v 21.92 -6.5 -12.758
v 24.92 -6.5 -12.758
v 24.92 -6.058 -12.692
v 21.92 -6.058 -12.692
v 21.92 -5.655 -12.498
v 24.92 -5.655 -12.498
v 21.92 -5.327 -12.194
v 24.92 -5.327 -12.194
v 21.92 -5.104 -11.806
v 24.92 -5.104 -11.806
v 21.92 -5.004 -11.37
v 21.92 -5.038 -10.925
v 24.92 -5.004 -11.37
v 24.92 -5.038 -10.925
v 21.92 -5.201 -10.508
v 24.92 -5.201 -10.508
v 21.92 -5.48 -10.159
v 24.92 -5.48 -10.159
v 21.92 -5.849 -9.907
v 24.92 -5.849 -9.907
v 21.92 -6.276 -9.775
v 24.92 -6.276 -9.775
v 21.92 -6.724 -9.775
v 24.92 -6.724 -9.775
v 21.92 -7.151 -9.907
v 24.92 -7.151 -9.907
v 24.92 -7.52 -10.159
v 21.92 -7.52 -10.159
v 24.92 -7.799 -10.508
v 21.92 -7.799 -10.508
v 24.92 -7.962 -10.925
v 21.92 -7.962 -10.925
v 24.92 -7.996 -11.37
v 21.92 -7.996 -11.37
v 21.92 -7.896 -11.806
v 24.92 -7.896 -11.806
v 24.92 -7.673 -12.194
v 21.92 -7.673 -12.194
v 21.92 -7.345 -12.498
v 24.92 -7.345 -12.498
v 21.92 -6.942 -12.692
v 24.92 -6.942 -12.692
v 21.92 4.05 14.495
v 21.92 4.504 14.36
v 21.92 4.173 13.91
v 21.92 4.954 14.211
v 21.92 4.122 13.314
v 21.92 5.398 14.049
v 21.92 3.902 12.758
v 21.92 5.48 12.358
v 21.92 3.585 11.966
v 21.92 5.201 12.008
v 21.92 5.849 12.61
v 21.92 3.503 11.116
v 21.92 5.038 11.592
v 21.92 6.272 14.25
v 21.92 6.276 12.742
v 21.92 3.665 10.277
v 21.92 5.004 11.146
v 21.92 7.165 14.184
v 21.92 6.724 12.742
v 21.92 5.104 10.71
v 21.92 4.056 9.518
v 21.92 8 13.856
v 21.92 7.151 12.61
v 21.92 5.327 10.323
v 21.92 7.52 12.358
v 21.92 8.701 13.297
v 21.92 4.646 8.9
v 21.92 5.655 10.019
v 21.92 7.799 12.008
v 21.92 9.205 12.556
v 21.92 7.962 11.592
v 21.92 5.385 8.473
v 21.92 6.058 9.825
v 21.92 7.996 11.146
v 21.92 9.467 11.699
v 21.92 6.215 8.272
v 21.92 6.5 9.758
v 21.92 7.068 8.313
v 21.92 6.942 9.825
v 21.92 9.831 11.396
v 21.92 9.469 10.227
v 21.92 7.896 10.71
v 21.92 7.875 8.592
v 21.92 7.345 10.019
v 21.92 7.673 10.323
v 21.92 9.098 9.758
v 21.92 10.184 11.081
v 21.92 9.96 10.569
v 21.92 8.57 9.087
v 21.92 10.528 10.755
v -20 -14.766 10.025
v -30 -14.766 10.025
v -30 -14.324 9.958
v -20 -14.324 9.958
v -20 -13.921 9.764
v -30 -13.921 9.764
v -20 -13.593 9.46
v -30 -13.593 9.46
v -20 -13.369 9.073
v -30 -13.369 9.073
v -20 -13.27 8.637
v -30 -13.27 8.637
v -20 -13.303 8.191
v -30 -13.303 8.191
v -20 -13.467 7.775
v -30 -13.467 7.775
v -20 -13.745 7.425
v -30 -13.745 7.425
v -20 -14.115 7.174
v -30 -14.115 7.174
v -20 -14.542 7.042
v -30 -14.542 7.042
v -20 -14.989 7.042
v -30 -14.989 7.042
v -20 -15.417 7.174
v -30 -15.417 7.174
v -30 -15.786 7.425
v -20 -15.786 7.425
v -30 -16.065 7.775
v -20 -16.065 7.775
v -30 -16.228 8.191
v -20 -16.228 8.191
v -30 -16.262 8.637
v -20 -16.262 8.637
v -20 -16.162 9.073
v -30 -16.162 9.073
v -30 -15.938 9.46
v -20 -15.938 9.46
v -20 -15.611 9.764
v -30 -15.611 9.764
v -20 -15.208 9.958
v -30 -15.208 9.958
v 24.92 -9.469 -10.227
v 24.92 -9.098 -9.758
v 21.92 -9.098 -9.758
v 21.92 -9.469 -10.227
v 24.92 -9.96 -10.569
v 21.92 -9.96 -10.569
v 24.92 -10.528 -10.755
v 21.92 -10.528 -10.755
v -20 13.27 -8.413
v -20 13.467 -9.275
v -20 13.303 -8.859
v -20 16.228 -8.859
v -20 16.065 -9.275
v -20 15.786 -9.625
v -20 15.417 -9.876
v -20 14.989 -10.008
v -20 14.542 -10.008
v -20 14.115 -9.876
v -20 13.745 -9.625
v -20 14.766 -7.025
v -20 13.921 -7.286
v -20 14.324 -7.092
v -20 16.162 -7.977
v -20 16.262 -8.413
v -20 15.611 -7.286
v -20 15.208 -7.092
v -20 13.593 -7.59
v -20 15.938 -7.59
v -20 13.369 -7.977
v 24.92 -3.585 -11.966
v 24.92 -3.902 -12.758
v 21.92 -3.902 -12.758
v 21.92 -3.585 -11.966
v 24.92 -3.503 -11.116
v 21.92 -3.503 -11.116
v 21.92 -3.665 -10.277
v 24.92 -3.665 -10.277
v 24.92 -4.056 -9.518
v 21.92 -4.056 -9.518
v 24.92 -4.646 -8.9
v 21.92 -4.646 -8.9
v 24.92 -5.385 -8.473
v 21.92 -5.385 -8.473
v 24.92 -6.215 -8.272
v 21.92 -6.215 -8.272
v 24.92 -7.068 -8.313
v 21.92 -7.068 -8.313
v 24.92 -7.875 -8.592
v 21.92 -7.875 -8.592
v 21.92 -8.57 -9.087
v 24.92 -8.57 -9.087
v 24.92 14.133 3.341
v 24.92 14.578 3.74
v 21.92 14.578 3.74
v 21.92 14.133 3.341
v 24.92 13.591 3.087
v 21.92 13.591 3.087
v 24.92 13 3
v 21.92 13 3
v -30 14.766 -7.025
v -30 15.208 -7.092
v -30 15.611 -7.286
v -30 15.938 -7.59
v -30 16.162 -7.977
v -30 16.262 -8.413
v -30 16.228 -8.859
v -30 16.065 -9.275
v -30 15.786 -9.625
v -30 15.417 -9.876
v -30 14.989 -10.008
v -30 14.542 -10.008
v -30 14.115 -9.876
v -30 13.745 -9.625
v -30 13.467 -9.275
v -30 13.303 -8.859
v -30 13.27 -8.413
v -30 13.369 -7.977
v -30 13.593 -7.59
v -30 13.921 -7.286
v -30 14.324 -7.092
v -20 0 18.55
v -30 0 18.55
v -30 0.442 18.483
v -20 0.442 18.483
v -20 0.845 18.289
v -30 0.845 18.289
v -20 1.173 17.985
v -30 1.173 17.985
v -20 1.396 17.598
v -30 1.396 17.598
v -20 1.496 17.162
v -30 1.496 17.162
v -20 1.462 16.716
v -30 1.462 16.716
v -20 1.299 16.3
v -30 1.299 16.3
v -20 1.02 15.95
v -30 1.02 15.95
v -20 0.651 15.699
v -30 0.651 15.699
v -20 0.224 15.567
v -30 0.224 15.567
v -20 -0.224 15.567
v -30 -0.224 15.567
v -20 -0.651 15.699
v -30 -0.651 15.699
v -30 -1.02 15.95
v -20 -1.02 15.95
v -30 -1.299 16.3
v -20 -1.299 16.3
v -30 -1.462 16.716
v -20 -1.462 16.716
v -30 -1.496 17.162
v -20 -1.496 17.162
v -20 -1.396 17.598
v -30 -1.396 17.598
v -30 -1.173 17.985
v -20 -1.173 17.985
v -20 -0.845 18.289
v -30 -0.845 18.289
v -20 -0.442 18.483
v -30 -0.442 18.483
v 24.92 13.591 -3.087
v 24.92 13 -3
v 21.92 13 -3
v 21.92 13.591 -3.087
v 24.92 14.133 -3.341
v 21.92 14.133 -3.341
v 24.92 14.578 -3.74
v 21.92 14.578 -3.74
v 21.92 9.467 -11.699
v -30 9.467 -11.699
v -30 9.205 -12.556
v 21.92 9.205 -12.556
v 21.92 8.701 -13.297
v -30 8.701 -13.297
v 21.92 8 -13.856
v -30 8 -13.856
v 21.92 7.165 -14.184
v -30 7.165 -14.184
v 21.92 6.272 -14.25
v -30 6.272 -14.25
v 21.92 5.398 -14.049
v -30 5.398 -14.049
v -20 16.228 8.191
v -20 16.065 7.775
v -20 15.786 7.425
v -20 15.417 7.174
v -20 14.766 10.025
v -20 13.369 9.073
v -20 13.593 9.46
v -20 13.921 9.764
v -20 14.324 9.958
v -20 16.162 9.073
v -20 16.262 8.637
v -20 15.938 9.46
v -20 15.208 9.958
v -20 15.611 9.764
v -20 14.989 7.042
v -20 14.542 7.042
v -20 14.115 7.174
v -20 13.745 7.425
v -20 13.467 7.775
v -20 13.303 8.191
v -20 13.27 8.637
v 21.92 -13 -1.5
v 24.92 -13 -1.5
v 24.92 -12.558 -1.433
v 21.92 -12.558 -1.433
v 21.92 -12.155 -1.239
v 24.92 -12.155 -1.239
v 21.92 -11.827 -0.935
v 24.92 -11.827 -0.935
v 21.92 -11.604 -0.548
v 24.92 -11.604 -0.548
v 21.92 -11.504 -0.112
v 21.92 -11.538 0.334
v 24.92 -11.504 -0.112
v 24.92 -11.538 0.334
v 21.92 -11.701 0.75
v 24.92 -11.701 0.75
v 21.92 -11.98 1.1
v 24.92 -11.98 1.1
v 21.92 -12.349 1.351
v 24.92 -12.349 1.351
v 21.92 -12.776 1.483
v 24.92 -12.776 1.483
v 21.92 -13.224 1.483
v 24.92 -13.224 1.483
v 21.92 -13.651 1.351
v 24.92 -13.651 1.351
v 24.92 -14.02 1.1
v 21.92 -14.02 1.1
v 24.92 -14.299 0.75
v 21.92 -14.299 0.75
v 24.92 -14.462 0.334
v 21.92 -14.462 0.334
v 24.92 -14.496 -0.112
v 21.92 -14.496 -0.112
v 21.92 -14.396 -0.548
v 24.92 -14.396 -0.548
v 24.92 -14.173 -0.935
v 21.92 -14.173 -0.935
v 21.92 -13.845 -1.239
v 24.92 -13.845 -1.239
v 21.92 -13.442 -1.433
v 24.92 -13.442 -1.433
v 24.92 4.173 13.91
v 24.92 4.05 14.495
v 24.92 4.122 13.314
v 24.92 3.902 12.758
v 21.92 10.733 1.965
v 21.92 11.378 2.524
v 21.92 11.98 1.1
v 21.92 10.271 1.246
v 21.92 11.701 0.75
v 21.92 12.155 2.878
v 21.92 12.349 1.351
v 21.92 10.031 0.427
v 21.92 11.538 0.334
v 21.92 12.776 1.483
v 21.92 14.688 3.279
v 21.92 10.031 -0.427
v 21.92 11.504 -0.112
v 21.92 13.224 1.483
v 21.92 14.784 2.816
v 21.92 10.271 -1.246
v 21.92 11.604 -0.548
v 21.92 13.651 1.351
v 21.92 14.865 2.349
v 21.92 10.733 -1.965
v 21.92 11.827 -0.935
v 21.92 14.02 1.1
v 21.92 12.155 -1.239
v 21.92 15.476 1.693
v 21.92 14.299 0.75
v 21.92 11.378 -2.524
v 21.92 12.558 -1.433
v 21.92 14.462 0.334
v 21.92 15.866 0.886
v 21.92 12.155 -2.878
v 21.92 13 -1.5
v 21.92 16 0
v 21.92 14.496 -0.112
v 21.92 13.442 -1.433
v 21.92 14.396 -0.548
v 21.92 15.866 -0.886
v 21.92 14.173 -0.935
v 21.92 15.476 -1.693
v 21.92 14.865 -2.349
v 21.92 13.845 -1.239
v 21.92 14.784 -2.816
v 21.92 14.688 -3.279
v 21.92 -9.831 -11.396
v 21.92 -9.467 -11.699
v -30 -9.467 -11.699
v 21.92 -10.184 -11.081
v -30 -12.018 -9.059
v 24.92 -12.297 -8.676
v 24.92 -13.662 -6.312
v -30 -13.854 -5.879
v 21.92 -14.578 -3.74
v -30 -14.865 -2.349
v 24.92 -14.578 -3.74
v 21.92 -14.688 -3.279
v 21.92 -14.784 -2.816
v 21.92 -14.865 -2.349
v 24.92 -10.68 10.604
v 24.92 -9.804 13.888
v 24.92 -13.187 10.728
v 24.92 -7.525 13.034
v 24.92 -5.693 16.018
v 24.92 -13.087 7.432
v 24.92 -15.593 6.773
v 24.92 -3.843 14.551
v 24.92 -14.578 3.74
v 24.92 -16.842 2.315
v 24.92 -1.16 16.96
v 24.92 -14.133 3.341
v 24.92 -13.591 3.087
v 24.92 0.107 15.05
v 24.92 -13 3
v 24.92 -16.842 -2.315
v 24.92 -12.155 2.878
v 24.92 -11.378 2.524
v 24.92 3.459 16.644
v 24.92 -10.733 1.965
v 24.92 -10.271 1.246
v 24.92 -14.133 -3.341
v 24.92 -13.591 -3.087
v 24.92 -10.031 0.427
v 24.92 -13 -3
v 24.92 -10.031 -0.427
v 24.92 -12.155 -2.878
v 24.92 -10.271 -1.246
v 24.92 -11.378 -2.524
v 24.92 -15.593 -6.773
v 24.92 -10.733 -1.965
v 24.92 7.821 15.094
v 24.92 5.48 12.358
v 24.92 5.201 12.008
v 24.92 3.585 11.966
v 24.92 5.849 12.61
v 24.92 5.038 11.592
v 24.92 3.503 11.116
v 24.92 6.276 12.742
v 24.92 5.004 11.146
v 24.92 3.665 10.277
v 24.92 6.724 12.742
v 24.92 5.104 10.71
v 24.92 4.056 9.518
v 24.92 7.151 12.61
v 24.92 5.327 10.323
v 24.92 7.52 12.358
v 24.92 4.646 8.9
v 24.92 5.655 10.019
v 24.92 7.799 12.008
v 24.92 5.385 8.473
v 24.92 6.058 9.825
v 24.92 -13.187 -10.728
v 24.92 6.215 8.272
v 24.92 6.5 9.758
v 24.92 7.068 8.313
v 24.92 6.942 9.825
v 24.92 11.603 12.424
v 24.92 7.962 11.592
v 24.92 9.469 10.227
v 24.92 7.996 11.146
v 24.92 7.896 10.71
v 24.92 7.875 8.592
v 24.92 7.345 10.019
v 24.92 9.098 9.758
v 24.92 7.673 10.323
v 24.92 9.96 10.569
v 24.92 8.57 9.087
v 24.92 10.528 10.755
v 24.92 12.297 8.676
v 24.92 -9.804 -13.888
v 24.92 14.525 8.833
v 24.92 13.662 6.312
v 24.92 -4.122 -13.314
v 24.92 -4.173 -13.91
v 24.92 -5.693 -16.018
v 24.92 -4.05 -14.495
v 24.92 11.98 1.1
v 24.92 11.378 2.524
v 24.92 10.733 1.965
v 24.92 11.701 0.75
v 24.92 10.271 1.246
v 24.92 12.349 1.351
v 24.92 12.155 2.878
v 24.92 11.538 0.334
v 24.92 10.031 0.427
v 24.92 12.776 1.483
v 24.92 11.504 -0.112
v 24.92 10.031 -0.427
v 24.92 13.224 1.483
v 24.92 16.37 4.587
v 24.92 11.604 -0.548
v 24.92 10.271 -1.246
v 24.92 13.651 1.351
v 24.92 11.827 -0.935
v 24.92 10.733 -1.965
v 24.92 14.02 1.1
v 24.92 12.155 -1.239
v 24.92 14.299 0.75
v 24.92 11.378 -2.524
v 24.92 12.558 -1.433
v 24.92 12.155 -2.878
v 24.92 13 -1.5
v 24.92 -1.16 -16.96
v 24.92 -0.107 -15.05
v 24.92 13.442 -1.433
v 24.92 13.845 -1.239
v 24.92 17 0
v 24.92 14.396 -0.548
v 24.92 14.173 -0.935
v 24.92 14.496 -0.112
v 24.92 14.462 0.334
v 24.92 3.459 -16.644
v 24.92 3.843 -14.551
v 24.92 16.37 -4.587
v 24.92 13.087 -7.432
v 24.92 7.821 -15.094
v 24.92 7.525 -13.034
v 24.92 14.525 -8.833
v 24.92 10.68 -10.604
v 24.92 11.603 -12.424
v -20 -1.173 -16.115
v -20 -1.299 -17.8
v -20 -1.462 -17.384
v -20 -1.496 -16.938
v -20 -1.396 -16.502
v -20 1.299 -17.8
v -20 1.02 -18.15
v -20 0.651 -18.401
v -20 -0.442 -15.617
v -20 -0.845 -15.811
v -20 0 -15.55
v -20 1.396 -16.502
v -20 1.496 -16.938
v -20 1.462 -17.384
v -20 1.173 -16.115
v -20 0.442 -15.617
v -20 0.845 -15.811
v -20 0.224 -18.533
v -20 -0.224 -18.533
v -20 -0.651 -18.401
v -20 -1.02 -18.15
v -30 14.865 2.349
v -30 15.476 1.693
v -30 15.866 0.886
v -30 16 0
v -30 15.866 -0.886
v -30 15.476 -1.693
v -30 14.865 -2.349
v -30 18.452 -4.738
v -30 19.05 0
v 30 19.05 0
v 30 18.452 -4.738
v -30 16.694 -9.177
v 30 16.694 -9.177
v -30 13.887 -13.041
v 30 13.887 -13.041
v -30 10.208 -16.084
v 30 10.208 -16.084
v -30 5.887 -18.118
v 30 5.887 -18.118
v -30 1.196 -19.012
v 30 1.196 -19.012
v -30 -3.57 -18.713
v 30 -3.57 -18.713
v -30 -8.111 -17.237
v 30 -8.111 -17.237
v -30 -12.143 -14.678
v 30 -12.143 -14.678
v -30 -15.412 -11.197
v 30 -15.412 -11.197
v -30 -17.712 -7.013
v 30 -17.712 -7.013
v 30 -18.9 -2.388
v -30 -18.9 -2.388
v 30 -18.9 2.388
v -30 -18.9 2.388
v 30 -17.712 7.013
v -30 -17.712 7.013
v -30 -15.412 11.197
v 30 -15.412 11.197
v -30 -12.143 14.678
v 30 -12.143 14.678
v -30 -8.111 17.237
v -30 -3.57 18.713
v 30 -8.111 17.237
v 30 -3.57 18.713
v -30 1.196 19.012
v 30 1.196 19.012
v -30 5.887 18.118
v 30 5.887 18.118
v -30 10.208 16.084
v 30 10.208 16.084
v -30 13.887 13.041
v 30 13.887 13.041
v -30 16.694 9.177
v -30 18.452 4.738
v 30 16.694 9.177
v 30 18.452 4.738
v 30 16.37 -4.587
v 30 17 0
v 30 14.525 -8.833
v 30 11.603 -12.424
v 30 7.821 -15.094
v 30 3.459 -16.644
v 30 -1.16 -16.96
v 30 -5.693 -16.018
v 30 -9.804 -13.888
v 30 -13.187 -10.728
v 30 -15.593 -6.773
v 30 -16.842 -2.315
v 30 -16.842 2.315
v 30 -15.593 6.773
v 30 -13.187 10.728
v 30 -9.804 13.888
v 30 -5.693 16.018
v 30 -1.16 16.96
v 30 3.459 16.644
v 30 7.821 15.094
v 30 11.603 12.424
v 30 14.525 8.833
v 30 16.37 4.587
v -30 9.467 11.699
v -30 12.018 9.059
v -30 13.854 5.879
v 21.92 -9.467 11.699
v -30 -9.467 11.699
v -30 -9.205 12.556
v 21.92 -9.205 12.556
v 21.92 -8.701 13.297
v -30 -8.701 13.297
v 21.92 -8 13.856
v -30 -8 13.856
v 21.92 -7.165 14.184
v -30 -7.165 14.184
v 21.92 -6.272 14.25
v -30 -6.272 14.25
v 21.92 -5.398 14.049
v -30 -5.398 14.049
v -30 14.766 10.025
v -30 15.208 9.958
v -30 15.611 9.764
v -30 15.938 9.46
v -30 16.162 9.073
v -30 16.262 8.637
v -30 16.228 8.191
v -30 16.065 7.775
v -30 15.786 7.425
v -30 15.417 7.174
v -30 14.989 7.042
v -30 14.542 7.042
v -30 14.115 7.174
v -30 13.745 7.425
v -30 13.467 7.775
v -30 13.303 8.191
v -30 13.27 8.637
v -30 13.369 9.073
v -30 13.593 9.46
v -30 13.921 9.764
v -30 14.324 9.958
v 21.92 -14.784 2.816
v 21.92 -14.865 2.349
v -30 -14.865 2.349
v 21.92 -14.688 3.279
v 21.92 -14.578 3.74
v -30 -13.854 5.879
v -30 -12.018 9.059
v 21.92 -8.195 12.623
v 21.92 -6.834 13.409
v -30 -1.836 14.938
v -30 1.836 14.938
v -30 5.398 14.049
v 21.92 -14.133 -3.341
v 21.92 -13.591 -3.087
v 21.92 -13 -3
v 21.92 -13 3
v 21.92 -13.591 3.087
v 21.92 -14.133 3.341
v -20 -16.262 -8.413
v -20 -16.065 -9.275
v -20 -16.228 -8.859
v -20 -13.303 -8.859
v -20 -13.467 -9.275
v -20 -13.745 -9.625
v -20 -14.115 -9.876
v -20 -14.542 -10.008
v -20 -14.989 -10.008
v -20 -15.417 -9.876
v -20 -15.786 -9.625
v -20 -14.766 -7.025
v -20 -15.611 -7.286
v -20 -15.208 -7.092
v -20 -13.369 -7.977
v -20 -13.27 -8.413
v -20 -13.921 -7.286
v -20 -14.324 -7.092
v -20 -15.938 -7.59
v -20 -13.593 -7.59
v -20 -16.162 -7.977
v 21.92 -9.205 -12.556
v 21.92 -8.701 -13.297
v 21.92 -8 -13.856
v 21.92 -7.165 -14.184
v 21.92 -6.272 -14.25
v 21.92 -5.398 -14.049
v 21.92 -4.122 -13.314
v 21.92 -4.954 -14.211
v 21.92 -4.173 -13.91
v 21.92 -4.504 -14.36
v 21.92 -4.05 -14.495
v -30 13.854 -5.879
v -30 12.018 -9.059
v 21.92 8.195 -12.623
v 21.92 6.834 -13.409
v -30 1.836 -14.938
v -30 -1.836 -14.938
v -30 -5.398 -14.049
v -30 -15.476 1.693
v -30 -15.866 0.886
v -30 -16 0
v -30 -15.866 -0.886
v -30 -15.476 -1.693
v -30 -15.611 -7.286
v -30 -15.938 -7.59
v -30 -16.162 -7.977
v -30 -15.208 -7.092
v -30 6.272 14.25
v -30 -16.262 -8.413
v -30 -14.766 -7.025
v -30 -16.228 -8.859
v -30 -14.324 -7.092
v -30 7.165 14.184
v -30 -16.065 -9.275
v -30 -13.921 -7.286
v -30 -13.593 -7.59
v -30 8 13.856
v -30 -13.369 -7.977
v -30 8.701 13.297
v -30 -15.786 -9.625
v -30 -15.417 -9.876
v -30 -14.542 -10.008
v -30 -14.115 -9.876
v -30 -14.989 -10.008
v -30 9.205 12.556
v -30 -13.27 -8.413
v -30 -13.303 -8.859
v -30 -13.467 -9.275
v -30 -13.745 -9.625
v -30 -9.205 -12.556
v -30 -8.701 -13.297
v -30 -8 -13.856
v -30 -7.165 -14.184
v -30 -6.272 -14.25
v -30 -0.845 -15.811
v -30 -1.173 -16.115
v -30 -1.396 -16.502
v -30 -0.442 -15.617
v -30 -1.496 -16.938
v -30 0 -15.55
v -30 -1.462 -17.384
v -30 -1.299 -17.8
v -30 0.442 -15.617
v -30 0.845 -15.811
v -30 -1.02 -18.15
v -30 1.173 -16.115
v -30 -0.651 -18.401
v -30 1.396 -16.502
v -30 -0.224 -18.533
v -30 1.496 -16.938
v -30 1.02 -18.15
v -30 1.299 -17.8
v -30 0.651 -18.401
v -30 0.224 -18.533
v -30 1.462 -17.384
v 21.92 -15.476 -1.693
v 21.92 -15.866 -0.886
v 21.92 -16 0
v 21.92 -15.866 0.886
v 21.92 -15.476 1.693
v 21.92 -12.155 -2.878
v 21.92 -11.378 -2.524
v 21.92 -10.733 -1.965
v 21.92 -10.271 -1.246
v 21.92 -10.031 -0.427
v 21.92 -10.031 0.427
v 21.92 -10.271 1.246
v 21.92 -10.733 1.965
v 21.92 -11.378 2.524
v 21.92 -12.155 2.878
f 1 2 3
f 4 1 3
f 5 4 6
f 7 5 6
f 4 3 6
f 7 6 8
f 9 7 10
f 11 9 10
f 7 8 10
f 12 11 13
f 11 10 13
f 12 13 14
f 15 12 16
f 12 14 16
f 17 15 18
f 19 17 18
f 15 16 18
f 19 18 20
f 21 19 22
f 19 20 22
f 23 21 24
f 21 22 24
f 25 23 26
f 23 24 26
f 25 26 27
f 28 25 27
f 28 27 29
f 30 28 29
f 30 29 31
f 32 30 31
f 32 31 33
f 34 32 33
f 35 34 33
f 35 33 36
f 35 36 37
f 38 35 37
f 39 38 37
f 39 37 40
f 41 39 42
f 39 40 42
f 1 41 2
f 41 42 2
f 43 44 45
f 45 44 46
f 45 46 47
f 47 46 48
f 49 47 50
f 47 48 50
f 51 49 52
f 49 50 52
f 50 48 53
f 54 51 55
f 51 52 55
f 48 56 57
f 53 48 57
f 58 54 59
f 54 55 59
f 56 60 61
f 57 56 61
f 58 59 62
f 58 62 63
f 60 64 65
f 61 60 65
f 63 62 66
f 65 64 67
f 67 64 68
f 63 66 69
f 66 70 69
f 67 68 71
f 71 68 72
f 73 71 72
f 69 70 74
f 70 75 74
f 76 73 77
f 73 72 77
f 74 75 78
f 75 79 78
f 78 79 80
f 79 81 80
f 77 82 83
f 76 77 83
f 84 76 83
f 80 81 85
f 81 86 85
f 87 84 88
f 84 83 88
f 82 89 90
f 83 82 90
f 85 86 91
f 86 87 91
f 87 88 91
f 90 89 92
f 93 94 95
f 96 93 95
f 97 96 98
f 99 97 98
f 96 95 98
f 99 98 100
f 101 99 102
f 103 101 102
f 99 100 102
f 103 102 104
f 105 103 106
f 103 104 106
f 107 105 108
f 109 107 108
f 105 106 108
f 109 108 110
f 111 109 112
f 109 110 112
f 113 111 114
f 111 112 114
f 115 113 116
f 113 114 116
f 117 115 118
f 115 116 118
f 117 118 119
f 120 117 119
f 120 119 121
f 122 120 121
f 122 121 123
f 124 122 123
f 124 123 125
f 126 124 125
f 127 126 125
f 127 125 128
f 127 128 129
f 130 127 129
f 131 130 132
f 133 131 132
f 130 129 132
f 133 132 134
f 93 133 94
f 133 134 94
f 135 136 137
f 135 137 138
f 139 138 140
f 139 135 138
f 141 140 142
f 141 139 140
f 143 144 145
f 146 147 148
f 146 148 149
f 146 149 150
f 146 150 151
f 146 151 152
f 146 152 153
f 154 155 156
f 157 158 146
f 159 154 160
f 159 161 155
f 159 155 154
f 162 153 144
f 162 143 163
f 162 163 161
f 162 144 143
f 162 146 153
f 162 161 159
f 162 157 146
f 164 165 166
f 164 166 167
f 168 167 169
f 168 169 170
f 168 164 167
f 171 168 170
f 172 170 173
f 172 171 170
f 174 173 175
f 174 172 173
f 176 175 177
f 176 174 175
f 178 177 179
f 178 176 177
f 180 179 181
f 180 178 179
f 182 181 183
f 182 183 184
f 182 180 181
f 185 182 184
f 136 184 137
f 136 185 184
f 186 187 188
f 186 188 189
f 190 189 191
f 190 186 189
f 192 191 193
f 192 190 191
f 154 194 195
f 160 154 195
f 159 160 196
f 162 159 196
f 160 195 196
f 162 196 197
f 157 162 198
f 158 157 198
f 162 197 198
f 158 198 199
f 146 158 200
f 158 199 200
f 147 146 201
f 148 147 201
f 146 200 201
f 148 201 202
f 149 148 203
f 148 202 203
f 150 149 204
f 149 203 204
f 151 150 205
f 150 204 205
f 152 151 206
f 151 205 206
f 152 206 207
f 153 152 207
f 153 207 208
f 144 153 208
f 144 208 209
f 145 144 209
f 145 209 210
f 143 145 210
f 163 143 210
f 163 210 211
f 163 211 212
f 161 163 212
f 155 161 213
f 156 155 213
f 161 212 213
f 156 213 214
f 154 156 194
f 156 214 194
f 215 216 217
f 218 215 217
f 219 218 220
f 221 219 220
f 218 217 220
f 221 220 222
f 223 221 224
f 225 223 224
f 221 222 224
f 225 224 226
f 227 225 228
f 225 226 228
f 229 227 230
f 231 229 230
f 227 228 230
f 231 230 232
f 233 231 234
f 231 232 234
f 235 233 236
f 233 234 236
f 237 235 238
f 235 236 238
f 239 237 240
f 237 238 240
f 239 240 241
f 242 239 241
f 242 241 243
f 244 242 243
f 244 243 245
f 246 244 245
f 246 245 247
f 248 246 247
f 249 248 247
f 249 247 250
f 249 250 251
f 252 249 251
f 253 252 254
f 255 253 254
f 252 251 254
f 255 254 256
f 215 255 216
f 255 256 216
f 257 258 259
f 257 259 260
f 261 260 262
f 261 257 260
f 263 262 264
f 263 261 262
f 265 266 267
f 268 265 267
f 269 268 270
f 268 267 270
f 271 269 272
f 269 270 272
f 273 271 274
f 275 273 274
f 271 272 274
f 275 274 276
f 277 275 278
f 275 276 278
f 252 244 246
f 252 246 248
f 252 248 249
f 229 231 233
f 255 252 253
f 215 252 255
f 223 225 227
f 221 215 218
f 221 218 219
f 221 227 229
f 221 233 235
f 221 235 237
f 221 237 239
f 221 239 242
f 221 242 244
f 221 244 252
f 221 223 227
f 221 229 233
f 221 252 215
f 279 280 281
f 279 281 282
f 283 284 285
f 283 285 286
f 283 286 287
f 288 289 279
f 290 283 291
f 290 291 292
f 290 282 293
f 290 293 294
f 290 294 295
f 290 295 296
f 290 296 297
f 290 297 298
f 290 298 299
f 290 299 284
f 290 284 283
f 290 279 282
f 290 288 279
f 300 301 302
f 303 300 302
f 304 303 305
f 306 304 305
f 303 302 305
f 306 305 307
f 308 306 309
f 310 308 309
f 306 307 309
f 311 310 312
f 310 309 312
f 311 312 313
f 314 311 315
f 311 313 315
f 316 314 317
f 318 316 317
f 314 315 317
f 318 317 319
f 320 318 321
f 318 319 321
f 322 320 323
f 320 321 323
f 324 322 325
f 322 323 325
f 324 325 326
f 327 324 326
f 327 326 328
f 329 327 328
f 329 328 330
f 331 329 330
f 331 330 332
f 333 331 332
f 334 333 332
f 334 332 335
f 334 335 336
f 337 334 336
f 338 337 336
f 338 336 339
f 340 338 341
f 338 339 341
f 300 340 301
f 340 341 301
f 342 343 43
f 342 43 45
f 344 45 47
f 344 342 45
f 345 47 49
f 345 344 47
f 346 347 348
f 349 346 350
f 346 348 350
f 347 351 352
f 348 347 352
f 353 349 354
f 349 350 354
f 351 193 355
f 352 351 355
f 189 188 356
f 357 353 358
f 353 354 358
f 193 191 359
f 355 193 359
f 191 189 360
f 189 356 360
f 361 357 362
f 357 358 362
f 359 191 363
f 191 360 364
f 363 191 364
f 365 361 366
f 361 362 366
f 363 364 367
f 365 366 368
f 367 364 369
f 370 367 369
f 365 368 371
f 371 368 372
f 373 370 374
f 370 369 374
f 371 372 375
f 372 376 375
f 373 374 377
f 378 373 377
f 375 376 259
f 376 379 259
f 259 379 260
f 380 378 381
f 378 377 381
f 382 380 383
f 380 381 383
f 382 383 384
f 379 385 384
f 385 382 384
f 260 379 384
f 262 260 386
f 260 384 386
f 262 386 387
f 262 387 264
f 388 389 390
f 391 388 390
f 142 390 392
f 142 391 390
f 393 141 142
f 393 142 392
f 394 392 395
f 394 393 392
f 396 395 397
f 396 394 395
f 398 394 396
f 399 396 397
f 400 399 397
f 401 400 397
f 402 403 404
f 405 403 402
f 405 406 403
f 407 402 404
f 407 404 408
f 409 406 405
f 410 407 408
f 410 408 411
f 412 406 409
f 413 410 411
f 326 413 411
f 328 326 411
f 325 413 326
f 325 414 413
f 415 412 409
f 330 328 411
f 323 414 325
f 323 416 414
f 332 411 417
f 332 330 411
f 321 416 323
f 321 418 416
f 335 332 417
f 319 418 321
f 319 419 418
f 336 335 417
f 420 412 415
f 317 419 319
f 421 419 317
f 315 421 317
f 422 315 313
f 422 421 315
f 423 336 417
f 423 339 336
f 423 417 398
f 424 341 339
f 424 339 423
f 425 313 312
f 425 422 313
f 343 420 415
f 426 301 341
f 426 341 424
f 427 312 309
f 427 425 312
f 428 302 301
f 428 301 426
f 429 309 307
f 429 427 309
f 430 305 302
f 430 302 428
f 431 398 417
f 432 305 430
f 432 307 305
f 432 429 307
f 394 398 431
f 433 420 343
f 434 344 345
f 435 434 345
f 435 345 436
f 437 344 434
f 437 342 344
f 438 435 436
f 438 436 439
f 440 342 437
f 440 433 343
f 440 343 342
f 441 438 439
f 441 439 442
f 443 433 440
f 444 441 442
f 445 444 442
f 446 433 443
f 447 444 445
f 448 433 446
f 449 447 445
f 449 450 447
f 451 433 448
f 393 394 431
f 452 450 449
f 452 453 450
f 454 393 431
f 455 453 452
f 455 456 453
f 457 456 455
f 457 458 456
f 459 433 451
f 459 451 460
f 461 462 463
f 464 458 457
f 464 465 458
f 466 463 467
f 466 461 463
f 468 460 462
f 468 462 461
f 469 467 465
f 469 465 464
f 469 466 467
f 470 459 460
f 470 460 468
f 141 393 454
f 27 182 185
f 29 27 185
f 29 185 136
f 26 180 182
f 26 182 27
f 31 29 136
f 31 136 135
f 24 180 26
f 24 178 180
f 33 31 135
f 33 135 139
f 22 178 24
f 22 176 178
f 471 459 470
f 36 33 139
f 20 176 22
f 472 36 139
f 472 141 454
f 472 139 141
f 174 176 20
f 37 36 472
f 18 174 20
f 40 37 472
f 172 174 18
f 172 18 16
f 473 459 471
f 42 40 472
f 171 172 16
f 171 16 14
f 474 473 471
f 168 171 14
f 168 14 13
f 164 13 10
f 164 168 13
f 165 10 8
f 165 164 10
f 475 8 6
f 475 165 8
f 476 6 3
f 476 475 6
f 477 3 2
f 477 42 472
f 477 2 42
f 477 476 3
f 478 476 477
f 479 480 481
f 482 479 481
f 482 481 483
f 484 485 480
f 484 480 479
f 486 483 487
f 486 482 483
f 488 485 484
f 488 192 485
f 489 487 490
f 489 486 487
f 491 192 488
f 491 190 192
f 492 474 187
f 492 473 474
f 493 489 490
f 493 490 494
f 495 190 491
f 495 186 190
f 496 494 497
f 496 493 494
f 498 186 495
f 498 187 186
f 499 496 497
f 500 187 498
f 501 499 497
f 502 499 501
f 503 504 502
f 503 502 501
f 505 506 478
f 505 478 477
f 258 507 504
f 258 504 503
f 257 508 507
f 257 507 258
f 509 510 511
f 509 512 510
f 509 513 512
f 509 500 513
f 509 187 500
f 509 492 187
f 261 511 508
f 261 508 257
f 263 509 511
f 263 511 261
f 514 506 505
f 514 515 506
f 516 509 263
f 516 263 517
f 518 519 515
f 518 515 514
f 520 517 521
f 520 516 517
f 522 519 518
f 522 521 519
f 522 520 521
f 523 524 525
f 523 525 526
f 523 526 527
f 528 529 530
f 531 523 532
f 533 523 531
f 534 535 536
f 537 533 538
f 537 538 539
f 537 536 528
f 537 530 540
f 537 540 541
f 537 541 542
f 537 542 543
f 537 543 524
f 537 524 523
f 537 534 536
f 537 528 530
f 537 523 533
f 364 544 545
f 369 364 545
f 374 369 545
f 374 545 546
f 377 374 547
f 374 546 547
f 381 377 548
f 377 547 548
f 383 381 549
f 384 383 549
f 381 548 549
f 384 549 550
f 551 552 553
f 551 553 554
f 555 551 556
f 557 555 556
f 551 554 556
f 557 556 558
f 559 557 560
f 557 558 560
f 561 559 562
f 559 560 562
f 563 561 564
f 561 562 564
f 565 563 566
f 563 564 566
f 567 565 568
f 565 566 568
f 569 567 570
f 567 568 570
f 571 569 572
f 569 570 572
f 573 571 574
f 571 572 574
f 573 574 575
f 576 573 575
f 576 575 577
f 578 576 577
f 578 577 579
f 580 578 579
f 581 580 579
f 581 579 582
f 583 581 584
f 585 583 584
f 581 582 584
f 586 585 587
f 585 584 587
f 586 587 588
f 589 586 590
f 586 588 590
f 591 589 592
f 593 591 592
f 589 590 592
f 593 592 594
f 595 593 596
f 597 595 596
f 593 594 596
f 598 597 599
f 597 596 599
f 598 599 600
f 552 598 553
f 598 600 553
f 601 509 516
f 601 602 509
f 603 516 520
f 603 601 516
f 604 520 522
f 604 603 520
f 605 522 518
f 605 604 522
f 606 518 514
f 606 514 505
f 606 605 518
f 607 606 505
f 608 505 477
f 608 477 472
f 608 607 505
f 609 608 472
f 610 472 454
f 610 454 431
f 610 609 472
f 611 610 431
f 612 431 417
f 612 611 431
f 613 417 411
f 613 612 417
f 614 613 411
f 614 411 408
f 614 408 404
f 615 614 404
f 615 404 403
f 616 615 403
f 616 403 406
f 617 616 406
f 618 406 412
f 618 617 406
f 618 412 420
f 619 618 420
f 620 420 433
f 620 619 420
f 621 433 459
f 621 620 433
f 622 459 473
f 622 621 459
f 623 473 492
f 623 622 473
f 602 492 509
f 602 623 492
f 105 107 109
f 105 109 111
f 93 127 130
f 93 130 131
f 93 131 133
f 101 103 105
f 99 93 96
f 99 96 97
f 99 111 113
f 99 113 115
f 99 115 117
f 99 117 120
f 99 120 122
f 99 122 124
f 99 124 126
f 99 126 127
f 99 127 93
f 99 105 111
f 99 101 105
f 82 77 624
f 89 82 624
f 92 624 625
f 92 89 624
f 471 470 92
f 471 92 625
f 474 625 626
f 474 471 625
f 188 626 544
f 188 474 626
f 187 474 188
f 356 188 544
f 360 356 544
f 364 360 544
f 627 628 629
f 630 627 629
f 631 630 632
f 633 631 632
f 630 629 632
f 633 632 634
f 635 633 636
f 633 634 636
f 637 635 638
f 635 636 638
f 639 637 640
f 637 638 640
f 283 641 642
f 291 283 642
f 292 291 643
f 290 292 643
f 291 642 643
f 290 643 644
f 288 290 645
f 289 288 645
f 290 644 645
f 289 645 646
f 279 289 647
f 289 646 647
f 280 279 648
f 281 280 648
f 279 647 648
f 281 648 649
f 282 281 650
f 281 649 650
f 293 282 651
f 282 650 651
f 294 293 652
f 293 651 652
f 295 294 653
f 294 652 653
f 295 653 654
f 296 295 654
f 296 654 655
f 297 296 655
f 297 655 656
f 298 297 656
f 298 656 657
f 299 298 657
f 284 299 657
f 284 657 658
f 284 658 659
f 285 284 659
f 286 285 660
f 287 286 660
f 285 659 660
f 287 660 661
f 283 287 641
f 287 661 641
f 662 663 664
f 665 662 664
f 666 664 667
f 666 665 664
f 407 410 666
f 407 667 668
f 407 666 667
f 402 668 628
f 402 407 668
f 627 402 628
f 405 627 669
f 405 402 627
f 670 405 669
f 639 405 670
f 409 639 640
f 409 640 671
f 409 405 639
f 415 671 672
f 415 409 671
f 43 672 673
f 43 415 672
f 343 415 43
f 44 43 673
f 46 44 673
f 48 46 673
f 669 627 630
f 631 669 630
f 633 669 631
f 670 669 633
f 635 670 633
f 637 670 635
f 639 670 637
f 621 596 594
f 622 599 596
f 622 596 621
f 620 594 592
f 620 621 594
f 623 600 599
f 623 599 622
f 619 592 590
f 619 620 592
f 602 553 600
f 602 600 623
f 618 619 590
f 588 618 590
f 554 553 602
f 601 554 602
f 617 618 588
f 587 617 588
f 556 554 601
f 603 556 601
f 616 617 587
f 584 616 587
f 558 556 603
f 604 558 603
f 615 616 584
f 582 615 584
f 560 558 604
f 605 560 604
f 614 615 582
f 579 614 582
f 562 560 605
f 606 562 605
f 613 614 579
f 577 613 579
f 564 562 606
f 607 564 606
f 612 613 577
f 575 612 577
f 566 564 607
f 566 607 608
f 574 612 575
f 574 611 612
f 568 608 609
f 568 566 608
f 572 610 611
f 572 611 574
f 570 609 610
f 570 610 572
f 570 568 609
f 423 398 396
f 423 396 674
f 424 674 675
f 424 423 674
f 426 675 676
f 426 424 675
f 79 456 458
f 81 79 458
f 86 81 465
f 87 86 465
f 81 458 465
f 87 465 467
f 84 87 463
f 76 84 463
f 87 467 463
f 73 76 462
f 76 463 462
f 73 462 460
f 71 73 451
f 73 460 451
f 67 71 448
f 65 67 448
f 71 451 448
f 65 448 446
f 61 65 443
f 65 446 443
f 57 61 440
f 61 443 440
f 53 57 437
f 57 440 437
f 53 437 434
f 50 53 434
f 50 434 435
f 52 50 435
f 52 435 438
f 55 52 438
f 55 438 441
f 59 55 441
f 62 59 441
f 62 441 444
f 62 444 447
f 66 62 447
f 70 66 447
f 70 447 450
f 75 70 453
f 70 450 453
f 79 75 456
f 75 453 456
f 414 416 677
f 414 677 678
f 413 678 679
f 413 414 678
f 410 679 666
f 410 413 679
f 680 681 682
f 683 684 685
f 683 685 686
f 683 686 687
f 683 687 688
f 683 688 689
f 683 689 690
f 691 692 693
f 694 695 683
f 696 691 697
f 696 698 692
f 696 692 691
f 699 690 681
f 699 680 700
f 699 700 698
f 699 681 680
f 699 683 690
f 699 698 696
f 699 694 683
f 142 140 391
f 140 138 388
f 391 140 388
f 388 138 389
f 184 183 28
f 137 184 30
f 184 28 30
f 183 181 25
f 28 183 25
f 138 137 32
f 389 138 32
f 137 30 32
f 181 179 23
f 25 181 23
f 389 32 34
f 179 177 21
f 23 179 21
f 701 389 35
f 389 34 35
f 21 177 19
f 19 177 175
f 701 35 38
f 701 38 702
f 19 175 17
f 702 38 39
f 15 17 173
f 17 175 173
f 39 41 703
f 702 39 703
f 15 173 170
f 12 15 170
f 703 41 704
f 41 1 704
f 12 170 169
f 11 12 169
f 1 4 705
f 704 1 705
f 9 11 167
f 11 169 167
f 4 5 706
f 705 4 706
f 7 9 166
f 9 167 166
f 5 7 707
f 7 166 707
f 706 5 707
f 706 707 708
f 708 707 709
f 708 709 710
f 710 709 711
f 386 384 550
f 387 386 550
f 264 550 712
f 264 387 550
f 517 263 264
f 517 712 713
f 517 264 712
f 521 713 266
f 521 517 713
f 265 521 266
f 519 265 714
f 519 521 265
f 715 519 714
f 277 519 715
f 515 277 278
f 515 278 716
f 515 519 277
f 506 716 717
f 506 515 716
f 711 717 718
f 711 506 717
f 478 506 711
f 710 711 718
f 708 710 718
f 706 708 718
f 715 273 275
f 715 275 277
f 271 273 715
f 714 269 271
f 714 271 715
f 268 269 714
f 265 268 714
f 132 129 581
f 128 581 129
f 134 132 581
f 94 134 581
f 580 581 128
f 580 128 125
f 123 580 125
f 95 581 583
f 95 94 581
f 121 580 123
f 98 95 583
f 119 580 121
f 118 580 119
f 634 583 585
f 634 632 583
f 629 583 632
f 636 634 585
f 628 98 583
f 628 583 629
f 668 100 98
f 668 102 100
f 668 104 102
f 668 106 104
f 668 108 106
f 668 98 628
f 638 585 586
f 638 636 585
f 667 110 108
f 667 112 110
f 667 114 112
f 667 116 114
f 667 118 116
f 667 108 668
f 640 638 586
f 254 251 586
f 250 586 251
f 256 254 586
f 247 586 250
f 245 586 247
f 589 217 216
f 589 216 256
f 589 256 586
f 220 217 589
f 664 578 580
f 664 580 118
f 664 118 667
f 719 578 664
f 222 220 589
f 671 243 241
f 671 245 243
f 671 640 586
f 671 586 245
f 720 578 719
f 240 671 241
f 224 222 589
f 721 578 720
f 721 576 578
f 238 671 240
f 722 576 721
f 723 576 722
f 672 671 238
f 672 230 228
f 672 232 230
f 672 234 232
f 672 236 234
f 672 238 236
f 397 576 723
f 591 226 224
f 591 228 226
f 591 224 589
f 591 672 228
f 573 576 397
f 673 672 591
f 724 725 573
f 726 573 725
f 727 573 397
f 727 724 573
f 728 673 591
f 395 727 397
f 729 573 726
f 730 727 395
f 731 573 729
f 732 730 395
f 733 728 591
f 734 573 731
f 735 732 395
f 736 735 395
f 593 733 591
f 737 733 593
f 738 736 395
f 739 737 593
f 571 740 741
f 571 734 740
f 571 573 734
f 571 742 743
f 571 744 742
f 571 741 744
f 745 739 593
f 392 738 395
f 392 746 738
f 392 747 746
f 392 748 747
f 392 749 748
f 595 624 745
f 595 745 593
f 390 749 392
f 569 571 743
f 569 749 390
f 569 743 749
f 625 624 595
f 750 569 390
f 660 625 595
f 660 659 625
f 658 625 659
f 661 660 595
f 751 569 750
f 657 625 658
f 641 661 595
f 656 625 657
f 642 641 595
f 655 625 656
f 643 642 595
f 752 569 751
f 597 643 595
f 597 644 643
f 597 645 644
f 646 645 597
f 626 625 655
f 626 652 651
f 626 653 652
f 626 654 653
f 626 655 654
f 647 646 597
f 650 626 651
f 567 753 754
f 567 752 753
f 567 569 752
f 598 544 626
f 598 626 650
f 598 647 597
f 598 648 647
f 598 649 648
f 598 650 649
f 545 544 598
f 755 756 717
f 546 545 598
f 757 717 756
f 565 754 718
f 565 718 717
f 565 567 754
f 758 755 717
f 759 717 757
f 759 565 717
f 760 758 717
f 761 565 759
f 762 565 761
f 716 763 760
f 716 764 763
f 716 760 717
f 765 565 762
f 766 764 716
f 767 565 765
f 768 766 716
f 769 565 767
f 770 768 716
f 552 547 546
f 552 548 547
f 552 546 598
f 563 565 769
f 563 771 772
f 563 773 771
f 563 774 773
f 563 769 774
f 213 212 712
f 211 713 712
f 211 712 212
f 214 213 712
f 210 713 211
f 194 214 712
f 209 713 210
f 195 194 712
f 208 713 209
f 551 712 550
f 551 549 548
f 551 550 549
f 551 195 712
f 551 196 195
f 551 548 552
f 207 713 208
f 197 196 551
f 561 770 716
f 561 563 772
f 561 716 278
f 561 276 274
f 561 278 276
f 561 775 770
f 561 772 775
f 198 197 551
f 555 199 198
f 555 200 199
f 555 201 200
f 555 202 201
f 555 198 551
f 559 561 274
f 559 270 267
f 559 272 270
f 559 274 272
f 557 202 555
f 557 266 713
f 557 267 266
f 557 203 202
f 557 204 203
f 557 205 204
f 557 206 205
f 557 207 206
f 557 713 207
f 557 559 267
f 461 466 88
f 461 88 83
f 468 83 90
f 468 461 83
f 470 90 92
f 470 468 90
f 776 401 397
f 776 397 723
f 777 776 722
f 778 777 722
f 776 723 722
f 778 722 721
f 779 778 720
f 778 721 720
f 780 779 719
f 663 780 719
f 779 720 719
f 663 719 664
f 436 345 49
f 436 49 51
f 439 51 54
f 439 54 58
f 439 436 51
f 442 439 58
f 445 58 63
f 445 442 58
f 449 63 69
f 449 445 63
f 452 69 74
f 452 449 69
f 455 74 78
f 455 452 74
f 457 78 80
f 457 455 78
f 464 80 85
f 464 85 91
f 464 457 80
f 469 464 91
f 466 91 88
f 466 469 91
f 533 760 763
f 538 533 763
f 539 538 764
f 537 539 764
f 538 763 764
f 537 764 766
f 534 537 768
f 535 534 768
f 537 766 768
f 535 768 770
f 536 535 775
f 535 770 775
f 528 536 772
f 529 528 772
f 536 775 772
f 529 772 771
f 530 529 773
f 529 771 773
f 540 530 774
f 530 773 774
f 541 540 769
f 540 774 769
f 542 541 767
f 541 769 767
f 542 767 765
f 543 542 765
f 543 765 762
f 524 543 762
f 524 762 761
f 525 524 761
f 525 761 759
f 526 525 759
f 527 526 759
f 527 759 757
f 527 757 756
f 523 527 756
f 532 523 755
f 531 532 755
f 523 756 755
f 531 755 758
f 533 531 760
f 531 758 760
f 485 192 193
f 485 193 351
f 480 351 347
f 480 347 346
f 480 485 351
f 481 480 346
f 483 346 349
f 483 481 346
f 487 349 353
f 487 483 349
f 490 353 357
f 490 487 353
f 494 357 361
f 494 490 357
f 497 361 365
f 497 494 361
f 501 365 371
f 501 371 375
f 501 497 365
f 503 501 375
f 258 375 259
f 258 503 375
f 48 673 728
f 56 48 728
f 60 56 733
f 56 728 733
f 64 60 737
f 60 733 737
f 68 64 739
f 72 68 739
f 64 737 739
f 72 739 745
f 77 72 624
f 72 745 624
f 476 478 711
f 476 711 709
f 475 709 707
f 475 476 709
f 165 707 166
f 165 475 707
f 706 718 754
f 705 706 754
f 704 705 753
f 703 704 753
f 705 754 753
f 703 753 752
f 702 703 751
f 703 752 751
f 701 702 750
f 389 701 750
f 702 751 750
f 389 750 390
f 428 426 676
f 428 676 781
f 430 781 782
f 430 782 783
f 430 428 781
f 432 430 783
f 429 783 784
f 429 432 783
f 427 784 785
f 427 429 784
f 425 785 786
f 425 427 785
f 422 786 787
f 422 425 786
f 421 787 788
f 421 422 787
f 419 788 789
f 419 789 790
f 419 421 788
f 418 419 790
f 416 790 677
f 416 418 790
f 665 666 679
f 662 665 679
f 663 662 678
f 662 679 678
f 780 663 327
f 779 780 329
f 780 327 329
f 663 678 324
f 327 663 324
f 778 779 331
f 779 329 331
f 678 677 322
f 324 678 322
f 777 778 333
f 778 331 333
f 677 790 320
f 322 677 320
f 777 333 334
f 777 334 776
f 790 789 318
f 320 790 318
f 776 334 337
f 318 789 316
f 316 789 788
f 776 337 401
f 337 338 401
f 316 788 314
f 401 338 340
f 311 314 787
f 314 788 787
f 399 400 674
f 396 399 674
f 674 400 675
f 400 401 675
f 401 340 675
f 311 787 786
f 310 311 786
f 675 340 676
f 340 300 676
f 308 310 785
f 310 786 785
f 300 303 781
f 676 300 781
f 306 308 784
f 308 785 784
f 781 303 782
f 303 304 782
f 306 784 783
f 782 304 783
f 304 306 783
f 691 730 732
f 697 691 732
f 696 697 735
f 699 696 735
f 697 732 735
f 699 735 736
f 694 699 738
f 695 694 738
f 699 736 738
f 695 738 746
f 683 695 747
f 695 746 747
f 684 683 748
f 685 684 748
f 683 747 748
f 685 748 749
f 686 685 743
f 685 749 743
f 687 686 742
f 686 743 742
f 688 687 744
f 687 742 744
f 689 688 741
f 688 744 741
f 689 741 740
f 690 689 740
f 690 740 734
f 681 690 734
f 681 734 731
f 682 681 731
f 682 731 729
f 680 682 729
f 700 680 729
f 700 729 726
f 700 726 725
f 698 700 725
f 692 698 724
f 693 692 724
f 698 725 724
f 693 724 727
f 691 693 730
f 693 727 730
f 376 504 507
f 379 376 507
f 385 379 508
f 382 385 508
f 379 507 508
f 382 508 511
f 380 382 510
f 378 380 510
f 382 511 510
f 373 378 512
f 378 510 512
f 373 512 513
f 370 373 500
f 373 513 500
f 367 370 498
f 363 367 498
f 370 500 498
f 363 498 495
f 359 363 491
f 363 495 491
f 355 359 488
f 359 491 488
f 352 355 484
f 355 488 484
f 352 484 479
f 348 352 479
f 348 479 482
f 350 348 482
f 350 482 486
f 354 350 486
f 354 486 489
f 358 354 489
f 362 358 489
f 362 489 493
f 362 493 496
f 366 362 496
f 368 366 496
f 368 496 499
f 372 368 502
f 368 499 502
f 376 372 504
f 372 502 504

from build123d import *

# Parameters (mm, degrees)
SKETCH1_W           = 60
SKETCH1_H           = 2.05
SKETCH1_W_2         = 47.3
SKETCH1_H_2         = 1.95
SKETCH1_W_3         = 1.27
SKETCH1_W_4         = 6.35
SKETCH2_R           = 1.5
BOSS_EXTRUDE1_DEPTH = 3
SKETCH5_R           = 1.5
CUT_EXTRUDE1_DEPTH  = 10
SKETCH6_R           = 3
SKETCH6_R_2         = 15.05
CUT_EXTRUDE2_DEPTH  = 51.92


with BuildPart() as part:
    # Sketch1 → Revolve1 (revolve)
    with BuildSketch(Plane.XY):
        with Locations((0, 18.025)):
            Rectangle(SKETCH1_W, SKETCH1_H)
        with Locations((0, 16.025)):
            Rectangle(SKETCH1_W_2, SKETCH1_H_2)
        with Locations((24.285, 16.025)):
            Rectangle(SKETCH1_W_3, SKETCH1_H_2)
        with Locations((-26.825, 16.025)):
            Rectangle(SKETCH1_W_4, SKETCH1_H_2)
    revolve(axis=Axis((0, 0, 0), (-1, 0, 0)))

    # Sketch2 → Boss-Extrude1 (add)
    with BuildSketch(Plane(origin=(24.92, 0, 0), x_dir=(0, 0, -1), z_dir=(1, 0, 0))):
        with BuildLine():
            ThreePointArc((-3.73983832, 14.577932273), (-3.194140619, 13.871382665), (-3, 13))
            ThreePointArc((-3, 13), (0, 10), (3, 13))
            ThreePointArc((3, 13), (3.194140619, 13.871382665), (3.73983832, 14.577932273))
            ThreePointArc((3.73983832, 14.577932273), (0, 15.05), (-3.73983832, 14.577932273))
        make_face()
        with Locations((0, 13)):
            Circle(SKETCH2_R, mode=Mode.SUBTRACT)
        with BuildLine():
            ThreePointArc((-9.758330249, 9.098076211), (-10.415899464, 9.701898251), (-10.754940523, 10.527761127))
            ThreePointArc((-10.754940523, 10.527761127), (-13.033682327, 7.525), (-14.494778842, 4.050171146))
            ThreePointArc((-14.494778842, 4.050171146), (-13.610040083, 4.169484414), (-12.758330249, 3.901923789))
            ThreePointArc((-12.758330249, 3.901923789), (-8.660254038, 5), (-9.758330249, 9.098076211))
        make_face()
        with Locations((-11.258330249, 6.5)):
            Circle(SKETCH2_R, mode=Mode.SUBTRACT)
        with BuildLine():
            ThreePointArc((10.754940523, -10.527761127), (13.033682327, -7.525), (14.494778842, -4.050171146))
            ThreePointArc((14.494778842, -4.050171146), (13.610040083, -4.169484414), (12.758330249, -3.901923789))
            ThreePointArc((12.758330249, -3.901923789), (8.660254038, -5), (9.758330249, -9.098076211))
            ThreePointArc((9.758330249, -9.098076211), (10.415899464, -9.701898251), (10.754940523, -10.527761127))
        make_face()
        with Locations((11.258330249, -6.5)):
            Circle(SKETCH2_R, mode=Mode.SUBTRACT)
        with BuildLine():
            ThreePointArc((-3, -13), (-3.194140619, -13.871382665), (-3.73983832, -14.577932273))
            ThreePointArc((-3.73983832, -14.577932273), (0, -15.05), (3.73983832, -14.577932273))
            ThreePointArc((3.73983832, -14.577932273), (3.194140619, -13.871382665), (3, -13))
            ThreePointArc((3, -13), (0, -10), (-3, -13))
        make_face()
        with Locations((0, -13)):
            Circle(SKETCH2_R, mode=Mode.SUBTRACT)
    extrude(amount=-BOSS_EXTRUDE1_DEPTH)

    # Sketch5 → Cut-Extrude1 (cut)
    with BuildSketch(Plane.ZY.offset(30)):
        with Locations((-8.525, -14.765733135)):
            Circle(SKETCH5_R)
        with Locations((8.525, -14.765733135)):
            Circle(SKETCH5_R)
        with Locations((17.05, 0)):
            Circle(SKETCH5_R)
        with Locations((-17.05, 0)):
            Circle(SKETCH5_R)
        with Locations((8.525, 14.765733135)):
            Circle(SKETCH5_R)
        with Locations((-8.525, 14.765733135)):
            Circle(SKETCH5_R)
    extrude(amount=-CUT_EXTRUDE1_DEPTH, mode=Mode.SUBTRACT)

    # Sketch6 → Cut-Extrude2 (cut)
    with BuildSketch(Plane.ZY.offset(30)):
        with Locations((-11.258330249, 6.5)):
            Circle(SKETCH6_R)
        Circle(SKETCH6_R_2)
        with Locations((-11.258330249, 6.5)):
            Circle(SKETCH6_R)
        Circle(SKETCH6_R_2)
        with Locations((0, 13)):
            Circle(SKETCH6_R)
        Circle(SKETCH6_R_2)
        with Locations((11.258330249, 6.5)):
            Circle(SKETCH6_R)
        Circle(SKETCH6_R_2)
        with Locations((11.258330249, 6.5)):
            Circle(SKETCH6_R)
        Circle(SKETCH6_R_2)
        with Locations((11.258330249, -6.5)):
            Circle(SKETCH6_R)
        Circle(SKETCH6_R_2)
        with Locations((11.258330249, -6.5)):
            Circle(SKETCH6_R)
        Circle(SKETCH6_R_2)
        with Locations((0, -13)):
            Circle(SKETCH6_R)
        Circle(SKETCH6_R_2)
        with Locations((0, -13)):
            Circle(SKETCH6_R)
        Circle(SKETCH6_R_2)
        with Locations((-11.258330249, -6.5)):
            Circle(SKETCH6_R)
        Circle(SKETCH6_R_2)
        with Locations((-11.258330249, -6.5)):
            Circle(SKETCH6_R)
        Circle(SKETCH6_R_2)
    extrude(amount=-CUT_EXTRUDE2_DEPTH, mode=Mode.SUBTRACT)


solid = part.part
